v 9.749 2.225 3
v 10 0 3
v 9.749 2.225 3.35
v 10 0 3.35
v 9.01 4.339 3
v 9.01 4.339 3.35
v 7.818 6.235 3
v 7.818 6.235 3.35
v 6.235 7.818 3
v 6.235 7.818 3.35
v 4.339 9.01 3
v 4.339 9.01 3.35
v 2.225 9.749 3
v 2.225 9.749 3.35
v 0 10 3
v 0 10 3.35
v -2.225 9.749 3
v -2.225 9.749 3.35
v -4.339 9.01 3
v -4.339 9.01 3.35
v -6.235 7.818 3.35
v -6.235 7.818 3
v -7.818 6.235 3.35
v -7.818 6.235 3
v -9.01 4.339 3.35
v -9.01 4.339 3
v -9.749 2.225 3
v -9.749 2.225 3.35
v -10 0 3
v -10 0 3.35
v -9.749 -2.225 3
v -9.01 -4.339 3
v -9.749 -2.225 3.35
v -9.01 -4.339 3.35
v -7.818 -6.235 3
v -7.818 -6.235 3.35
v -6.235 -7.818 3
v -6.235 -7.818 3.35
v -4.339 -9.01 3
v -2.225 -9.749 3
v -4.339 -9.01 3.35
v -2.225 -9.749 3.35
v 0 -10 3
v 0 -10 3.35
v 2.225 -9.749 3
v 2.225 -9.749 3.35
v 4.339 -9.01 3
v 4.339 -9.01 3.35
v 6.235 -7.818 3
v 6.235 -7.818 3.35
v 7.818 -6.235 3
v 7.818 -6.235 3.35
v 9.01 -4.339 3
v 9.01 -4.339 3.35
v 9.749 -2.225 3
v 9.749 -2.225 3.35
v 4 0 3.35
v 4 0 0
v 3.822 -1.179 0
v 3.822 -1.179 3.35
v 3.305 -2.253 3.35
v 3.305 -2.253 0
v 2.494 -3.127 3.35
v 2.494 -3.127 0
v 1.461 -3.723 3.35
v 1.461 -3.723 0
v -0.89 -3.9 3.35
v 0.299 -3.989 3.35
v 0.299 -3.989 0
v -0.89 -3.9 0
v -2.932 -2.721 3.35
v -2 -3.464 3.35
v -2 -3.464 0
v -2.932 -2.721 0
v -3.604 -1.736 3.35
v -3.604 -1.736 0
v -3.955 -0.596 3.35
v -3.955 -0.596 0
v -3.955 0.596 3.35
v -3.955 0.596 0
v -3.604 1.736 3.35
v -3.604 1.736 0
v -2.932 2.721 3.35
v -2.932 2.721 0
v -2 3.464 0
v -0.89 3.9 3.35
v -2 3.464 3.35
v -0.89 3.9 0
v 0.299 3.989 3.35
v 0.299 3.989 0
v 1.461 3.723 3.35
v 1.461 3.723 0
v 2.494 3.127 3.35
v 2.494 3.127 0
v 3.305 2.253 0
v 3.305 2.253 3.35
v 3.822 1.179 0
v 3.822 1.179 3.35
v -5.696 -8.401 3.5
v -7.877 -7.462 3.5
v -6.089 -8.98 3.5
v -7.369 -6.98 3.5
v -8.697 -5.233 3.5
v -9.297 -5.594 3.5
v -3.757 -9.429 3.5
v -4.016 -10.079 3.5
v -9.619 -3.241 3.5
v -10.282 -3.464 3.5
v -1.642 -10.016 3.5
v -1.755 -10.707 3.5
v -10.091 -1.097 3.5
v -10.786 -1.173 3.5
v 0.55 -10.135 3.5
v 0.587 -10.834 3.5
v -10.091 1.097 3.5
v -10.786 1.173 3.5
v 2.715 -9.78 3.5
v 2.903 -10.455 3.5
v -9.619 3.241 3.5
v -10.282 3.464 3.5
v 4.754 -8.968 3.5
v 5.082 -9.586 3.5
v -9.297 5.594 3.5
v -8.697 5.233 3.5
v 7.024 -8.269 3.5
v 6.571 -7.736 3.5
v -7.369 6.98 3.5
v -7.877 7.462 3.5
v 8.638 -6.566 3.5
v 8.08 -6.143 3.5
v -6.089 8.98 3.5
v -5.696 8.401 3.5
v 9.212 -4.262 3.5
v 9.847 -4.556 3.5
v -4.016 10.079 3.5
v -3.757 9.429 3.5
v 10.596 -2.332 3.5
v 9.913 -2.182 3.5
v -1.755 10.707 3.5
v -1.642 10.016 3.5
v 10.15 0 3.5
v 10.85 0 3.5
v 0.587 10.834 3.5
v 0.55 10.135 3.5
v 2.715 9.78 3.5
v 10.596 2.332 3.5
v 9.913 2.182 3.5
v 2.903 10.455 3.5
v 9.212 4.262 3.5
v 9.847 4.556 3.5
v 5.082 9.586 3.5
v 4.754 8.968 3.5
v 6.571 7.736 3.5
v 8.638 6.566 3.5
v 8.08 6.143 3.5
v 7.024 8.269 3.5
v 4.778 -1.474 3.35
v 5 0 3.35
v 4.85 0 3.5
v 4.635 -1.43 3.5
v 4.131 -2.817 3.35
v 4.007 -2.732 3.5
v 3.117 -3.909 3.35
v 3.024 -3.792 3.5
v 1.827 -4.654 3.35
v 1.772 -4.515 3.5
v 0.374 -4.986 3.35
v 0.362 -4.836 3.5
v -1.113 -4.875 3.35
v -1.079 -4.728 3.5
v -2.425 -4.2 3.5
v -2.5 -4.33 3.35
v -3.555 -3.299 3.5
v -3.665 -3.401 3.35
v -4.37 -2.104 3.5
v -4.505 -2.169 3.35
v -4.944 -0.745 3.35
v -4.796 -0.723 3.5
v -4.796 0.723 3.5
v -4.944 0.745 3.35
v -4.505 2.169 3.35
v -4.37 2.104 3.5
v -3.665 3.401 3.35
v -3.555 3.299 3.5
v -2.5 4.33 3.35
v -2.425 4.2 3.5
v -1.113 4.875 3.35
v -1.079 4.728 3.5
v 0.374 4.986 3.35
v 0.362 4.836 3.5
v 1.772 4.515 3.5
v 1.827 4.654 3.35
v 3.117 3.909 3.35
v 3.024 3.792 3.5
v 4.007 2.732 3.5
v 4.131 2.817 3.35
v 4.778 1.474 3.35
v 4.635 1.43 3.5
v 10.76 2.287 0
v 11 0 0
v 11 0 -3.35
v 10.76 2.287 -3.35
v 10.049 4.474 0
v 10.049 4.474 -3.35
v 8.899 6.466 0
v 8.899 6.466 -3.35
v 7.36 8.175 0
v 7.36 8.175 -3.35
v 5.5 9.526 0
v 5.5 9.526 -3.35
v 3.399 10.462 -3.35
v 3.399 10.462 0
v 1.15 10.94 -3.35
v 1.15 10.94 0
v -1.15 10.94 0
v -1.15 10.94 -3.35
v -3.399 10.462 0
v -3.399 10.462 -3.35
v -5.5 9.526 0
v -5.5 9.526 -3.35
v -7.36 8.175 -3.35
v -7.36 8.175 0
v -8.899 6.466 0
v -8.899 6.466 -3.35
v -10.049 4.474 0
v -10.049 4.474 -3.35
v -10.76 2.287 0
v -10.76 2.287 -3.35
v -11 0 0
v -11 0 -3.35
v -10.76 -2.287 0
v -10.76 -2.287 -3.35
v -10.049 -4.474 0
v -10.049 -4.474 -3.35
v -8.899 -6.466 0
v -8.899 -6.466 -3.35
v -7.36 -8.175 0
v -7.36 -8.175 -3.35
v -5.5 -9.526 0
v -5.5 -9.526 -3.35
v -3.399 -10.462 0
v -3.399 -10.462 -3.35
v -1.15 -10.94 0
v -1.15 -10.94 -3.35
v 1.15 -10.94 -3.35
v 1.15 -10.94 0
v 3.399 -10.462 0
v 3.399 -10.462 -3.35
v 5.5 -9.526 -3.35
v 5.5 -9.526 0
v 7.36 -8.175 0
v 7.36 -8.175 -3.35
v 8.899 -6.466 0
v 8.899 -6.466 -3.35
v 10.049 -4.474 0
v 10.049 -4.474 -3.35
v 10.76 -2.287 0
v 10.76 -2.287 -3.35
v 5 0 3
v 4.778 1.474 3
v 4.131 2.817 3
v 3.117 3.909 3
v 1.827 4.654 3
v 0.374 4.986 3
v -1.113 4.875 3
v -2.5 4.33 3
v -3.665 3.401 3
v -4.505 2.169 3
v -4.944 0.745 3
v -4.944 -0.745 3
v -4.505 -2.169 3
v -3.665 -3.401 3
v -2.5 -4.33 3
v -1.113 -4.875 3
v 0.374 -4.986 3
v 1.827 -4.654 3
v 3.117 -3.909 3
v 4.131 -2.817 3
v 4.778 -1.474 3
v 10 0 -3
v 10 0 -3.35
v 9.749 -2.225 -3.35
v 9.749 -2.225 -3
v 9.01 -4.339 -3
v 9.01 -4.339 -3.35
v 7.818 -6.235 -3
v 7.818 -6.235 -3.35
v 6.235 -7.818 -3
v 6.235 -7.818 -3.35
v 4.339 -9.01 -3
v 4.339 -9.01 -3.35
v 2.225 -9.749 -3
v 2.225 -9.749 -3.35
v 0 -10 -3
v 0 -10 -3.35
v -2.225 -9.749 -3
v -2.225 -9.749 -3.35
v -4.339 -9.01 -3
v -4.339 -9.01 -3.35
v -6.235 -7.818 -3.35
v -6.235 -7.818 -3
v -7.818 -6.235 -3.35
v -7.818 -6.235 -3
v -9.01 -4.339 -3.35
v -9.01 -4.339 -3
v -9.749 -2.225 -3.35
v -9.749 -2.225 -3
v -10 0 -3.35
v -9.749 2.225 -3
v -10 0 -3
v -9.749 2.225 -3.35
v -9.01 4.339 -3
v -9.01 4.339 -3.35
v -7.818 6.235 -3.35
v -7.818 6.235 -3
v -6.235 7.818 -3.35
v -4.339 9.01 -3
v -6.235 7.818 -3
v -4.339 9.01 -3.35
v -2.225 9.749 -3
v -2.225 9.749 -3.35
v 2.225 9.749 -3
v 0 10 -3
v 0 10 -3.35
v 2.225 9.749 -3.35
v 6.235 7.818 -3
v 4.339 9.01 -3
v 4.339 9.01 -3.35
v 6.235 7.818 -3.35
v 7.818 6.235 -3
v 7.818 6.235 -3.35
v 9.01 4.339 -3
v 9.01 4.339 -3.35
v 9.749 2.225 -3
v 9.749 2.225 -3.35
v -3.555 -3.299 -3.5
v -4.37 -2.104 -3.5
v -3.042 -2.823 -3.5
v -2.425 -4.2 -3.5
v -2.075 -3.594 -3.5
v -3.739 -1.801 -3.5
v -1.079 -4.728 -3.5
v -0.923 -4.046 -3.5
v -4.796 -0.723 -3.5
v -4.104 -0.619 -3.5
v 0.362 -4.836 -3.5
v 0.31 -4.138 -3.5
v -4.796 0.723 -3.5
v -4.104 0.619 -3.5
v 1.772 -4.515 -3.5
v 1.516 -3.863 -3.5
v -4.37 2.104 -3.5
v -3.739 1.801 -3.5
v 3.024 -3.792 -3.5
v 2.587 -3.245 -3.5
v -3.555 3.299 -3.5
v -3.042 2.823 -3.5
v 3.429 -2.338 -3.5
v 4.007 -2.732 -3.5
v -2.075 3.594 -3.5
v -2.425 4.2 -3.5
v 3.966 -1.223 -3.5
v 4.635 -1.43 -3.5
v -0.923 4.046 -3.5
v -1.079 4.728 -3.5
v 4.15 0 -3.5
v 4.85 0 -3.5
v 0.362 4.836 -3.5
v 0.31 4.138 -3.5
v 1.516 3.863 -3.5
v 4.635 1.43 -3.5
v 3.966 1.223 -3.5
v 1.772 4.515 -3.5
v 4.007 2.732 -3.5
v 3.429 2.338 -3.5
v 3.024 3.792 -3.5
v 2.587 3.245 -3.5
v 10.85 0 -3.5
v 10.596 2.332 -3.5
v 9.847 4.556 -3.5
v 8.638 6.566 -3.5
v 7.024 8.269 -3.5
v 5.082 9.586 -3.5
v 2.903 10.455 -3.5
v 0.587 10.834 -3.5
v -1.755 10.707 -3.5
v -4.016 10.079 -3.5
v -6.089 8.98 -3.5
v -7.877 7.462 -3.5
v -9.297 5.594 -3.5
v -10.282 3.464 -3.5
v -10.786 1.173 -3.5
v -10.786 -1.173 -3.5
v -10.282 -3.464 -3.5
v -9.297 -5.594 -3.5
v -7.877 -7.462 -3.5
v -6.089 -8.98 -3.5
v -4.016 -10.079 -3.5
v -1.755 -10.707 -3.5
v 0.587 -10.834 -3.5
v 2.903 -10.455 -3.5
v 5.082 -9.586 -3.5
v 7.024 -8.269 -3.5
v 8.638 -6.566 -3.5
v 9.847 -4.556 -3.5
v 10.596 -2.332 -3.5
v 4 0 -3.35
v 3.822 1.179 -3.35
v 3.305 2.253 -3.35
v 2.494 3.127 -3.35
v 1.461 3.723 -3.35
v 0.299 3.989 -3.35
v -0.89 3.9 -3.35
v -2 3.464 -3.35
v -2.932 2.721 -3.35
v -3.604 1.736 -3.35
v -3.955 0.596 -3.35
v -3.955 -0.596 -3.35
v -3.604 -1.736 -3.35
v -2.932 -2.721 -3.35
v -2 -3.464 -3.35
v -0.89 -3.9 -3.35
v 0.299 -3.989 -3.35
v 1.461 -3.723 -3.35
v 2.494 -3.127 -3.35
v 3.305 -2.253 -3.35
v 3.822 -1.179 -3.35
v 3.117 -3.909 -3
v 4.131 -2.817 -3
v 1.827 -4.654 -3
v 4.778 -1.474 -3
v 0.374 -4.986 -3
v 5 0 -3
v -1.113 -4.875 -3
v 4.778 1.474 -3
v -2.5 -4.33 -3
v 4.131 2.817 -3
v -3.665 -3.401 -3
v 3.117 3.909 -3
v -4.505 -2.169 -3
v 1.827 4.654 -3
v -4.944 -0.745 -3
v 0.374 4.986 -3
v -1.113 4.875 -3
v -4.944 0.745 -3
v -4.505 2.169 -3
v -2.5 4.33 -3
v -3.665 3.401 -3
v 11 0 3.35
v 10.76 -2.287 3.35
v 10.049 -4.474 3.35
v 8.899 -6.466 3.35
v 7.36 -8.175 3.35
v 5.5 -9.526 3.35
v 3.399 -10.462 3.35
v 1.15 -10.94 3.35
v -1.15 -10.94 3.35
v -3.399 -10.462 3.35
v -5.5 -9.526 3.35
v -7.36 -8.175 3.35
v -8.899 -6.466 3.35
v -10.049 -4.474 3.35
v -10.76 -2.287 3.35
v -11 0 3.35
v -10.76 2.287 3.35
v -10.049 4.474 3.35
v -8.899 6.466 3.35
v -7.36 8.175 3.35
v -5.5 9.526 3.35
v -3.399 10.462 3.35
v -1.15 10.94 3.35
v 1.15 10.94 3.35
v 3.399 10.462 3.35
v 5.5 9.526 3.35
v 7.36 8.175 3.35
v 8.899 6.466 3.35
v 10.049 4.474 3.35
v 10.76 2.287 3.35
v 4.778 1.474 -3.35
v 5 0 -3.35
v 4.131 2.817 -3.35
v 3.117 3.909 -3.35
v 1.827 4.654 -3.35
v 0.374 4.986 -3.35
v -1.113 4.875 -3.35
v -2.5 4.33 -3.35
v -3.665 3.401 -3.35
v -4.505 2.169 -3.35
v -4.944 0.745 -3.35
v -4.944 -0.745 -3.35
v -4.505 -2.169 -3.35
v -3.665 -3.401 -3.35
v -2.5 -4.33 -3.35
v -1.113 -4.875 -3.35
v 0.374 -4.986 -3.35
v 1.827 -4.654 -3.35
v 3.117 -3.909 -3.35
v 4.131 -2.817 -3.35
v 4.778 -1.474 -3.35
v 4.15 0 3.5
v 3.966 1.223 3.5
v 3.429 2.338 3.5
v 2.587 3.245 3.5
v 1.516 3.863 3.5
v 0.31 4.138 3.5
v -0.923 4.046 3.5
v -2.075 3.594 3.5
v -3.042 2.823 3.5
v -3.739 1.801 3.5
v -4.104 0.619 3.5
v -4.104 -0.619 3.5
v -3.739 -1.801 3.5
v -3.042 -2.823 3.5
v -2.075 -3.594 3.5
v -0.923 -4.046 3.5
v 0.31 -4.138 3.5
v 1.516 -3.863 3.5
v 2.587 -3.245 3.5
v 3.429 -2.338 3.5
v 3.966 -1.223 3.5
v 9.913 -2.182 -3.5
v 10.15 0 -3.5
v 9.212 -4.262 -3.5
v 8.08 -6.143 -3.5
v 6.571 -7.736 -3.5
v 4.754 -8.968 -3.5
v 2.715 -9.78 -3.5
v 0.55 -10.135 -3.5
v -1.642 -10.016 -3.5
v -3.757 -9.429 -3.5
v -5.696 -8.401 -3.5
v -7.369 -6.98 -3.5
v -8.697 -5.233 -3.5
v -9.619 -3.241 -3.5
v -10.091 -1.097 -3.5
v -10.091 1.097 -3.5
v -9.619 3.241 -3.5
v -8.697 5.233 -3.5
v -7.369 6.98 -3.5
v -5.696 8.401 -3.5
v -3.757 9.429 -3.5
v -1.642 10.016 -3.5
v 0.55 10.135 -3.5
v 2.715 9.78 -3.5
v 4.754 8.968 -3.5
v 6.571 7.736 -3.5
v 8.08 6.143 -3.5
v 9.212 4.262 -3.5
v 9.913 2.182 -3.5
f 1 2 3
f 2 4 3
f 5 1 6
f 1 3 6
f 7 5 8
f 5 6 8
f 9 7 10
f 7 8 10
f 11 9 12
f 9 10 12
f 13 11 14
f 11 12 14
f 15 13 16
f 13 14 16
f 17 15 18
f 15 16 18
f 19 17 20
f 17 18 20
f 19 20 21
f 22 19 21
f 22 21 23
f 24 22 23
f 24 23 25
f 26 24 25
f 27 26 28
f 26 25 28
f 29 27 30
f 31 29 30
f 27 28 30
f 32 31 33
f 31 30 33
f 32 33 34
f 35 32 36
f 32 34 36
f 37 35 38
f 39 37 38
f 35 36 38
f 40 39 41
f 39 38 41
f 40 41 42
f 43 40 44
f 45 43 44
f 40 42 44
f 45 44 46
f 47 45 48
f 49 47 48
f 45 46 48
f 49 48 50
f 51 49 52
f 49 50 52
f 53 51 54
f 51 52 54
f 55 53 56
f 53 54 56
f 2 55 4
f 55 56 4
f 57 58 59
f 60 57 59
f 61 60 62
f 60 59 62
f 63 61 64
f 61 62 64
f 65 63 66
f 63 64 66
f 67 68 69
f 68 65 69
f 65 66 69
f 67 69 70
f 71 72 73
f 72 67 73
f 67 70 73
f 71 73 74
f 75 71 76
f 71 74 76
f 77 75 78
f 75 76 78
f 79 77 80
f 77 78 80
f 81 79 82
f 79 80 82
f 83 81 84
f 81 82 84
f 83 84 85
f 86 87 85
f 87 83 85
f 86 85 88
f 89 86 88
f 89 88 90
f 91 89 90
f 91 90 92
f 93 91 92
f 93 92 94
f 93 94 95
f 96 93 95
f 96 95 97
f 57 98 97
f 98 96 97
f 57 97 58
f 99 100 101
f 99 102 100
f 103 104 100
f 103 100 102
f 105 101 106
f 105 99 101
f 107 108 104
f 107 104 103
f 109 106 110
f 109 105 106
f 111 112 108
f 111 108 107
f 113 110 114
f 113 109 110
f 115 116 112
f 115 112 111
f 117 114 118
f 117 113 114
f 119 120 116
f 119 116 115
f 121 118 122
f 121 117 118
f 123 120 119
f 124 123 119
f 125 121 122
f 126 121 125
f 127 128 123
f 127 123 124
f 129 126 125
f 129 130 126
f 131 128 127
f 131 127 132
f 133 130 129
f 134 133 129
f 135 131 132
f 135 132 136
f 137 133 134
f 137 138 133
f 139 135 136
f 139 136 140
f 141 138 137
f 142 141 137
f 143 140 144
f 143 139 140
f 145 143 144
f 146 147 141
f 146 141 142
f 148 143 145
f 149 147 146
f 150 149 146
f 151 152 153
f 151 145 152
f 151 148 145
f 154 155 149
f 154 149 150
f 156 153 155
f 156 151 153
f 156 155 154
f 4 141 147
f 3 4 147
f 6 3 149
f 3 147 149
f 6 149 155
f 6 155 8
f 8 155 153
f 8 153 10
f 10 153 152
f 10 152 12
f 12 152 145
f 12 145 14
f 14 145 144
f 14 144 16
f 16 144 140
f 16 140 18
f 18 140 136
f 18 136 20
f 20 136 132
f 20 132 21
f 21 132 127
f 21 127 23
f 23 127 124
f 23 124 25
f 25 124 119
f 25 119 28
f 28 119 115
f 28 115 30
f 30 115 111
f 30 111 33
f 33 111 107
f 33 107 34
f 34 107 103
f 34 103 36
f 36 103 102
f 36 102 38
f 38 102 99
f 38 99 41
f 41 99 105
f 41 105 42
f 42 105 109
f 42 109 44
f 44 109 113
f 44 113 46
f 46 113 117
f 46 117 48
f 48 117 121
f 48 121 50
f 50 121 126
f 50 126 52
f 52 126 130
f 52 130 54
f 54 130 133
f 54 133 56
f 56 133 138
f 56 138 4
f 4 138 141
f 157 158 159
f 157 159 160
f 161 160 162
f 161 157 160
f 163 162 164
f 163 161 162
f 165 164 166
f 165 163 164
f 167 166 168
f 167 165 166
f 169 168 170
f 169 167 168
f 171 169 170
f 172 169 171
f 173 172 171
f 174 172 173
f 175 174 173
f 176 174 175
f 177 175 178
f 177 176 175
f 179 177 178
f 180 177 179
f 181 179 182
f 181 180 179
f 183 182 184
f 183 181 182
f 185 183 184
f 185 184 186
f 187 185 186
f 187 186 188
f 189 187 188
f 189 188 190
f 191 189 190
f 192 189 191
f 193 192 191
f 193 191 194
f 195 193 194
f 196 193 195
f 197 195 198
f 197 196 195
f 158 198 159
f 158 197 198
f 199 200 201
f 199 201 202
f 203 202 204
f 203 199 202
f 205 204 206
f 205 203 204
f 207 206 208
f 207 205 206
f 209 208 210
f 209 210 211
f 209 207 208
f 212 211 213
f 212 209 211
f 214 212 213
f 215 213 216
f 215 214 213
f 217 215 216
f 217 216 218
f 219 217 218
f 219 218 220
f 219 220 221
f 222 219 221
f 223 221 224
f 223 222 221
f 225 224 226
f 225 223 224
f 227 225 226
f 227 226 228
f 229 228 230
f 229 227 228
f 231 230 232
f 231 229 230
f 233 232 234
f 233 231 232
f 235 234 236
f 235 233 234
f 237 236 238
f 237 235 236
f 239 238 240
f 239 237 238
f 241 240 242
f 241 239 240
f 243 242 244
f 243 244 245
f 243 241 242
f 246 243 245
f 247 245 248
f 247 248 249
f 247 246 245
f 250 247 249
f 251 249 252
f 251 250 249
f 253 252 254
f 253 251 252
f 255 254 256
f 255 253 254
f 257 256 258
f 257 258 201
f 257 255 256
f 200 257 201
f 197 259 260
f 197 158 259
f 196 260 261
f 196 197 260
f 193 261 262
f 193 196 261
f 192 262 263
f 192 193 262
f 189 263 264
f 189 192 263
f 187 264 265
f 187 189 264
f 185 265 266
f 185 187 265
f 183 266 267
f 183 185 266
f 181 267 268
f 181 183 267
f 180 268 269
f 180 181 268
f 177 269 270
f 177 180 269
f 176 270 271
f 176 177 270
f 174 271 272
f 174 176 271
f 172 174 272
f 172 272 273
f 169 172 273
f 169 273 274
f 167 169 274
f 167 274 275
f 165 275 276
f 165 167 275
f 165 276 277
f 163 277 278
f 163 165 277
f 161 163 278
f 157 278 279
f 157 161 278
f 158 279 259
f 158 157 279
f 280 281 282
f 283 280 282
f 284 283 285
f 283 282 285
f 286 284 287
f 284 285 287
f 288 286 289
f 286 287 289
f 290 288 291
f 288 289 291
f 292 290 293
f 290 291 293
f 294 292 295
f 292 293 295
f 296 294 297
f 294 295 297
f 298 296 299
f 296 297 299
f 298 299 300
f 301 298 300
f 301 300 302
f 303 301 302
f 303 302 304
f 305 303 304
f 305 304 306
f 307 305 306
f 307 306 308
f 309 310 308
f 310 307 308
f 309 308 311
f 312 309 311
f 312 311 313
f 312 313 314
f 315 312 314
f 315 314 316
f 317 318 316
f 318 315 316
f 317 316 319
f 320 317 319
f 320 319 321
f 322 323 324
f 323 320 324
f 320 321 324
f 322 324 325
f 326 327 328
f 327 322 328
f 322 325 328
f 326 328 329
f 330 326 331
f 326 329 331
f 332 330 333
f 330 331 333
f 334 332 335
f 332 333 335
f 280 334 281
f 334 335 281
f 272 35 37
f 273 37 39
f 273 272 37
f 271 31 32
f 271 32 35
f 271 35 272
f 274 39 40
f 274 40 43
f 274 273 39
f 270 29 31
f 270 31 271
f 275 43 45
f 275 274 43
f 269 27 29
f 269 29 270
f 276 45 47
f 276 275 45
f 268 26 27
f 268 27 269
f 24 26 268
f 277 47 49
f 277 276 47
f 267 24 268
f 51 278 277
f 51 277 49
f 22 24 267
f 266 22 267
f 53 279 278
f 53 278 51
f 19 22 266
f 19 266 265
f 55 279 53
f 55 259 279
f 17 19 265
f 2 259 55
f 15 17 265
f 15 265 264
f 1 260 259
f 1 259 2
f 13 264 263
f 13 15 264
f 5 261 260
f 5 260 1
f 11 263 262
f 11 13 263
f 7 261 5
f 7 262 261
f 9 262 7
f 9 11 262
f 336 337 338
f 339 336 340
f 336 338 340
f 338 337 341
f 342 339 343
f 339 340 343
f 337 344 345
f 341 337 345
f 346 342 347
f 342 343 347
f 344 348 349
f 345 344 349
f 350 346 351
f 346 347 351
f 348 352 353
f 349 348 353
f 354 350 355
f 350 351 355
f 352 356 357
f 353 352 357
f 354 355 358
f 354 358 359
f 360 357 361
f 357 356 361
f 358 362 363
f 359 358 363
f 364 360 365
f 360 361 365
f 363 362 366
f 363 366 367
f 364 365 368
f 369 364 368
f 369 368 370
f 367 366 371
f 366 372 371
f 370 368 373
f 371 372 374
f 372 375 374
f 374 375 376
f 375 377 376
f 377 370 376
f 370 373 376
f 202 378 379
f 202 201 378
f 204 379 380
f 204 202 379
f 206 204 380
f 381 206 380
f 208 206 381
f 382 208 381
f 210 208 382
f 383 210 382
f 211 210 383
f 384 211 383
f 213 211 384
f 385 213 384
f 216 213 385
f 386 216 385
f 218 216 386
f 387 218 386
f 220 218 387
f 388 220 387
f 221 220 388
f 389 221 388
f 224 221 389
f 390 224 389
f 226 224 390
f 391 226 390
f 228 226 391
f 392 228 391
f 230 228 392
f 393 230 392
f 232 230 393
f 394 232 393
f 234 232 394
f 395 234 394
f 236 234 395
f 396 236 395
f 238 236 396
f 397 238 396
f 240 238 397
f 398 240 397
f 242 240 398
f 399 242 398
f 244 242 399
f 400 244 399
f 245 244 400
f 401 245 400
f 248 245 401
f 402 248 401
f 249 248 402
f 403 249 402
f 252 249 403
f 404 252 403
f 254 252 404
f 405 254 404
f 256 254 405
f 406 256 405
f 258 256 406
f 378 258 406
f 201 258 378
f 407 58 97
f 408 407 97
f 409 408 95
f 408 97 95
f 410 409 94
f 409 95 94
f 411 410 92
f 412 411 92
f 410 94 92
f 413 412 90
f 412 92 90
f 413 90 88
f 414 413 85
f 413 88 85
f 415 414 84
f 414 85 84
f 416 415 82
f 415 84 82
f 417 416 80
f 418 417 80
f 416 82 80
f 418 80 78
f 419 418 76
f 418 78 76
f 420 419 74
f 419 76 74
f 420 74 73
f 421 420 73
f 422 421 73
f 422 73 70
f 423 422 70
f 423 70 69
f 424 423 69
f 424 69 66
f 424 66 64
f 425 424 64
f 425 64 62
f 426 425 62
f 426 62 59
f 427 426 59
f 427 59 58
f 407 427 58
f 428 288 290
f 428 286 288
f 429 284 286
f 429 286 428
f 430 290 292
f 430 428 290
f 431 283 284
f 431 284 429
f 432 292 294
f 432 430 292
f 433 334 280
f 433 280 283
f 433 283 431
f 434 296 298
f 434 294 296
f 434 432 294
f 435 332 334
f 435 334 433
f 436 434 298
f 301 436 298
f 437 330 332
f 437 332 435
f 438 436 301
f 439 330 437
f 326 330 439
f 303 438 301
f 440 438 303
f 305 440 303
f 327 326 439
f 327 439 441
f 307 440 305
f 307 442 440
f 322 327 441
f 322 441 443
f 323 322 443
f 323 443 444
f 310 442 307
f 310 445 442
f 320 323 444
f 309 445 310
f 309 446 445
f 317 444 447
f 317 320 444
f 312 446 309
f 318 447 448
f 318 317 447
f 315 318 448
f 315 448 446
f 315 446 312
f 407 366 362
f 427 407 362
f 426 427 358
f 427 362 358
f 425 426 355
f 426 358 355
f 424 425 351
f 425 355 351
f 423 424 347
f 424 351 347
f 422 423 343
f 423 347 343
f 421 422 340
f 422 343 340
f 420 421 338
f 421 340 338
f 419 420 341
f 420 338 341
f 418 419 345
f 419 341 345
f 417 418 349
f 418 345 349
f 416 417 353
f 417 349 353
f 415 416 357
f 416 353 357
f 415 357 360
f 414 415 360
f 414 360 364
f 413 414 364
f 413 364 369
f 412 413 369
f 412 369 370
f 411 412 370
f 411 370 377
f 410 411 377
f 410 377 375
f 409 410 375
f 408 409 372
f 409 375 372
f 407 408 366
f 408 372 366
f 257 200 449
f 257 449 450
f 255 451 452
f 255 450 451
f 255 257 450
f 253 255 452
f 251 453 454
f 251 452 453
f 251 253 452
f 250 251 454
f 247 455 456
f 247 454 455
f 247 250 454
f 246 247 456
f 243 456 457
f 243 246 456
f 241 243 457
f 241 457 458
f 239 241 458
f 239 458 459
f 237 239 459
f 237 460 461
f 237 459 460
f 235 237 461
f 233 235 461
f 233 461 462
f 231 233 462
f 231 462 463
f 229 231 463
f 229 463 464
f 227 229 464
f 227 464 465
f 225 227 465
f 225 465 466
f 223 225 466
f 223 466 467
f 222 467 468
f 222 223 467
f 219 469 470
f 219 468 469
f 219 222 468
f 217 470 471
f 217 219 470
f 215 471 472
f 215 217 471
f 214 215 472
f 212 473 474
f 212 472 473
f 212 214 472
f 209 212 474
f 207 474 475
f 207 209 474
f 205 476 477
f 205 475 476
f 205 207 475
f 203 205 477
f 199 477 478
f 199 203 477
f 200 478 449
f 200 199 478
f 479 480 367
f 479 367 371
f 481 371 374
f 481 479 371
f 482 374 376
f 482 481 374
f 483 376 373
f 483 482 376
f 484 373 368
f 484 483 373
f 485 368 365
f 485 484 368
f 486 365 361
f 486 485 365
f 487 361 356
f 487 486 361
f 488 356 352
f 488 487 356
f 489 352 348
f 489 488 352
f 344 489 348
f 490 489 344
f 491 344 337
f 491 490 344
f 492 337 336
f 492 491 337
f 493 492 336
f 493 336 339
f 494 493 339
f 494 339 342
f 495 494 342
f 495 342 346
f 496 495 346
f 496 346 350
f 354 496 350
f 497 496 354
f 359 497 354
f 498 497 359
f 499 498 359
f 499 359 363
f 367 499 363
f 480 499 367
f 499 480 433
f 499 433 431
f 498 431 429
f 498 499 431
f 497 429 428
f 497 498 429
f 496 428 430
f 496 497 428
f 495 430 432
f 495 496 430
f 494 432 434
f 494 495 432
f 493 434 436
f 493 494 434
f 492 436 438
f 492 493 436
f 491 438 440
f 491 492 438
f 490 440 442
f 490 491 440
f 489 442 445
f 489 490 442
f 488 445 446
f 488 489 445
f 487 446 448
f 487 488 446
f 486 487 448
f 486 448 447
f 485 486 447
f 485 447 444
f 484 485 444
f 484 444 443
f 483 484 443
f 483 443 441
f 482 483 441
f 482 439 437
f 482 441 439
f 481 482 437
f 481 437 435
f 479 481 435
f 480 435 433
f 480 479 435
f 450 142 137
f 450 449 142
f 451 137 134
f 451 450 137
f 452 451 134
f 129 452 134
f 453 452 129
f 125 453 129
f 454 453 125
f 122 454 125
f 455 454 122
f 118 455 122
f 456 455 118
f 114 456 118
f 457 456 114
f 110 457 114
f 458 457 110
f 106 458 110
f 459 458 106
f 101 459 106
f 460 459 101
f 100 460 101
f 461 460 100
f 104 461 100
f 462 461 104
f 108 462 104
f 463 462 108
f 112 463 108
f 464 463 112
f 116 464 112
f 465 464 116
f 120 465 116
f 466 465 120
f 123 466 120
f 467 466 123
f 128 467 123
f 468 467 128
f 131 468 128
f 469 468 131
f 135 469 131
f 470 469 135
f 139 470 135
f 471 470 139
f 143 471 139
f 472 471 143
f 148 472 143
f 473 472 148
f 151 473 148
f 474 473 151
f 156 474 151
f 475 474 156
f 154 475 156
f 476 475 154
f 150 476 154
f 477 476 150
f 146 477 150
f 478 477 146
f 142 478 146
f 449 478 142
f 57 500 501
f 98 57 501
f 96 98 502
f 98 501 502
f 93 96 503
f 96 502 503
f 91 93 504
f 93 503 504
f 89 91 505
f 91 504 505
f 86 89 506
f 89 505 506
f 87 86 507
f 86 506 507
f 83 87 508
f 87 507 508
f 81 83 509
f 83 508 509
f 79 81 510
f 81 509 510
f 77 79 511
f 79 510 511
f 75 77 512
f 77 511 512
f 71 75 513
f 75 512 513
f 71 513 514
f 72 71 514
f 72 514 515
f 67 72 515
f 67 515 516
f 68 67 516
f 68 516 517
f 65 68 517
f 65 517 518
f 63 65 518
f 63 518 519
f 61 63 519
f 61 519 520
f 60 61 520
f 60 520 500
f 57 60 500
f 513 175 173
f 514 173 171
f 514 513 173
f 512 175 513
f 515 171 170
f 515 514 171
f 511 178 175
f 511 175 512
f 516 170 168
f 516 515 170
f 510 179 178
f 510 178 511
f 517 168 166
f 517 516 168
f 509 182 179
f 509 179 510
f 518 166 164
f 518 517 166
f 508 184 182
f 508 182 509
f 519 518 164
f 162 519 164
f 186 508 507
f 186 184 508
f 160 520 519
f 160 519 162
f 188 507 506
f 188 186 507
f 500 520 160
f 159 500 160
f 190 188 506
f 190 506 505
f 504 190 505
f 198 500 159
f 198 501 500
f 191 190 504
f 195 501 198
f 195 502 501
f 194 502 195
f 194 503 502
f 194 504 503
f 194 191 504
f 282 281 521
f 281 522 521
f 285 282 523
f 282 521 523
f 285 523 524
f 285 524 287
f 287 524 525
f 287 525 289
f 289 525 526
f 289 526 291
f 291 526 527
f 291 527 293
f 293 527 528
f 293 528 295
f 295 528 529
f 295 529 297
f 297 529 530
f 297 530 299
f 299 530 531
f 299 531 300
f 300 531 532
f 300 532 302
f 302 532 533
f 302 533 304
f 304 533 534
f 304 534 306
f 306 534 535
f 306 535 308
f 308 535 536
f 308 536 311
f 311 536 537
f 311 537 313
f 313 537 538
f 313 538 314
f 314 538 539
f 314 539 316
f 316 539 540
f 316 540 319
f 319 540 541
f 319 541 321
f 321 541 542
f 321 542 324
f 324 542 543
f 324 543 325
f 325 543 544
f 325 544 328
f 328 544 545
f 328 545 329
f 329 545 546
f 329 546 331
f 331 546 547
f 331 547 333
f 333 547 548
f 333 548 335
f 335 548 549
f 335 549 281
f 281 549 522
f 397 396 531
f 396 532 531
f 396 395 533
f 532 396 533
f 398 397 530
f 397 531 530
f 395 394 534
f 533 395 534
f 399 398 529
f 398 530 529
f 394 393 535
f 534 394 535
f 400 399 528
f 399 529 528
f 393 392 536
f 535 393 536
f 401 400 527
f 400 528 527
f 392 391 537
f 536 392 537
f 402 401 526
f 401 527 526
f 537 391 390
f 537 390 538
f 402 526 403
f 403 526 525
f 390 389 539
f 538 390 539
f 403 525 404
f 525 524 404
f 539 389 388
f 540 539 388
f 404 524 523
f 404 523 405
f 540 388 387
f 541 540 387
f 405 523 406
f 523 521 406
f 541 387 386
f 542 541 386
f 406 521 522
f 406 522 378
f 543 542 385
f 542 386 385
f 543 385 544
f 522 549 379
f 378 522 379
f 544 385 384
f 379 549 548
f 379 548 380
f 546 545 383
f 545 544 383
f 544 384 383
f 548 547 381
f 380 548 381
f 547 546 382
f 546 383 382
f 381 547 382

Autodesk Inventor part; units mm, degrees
ref_plane "YZ Plane" through (0, 0, 0) normal (1, 0, 0) x (0, 1, 0)
ref_plane "XZ Plane" through (0, 0, 0) normal (0, 1, 0) x (-1, 0, 0)
ref_plane "XY Plane" through (0, 0, 0) normal (0, 0, 1) x (1, 0, 0)
sketch "Sketch1" plane through (0, 0, 0) normal (0, 0, 1) x (1, 0, 0)
  circle A0 centre (0, 0) radius 11
  circle A1 centre (0, 0) radius 4
  dimension "d0" = 22
  dimension "d1" = 8
extrude "Extrusion1" add sketch "Sketch1" along normal mid plane 7
sketch "Sketch2" plane through (0, 0, 3.5) normal (0, 0, 1) x (1, 0, 0)
  circle A0 centre (0, 0) radius 10
  circle A1 centre (0, 0) radius 5
  circle A2 centre (0, 0) radius 11 projected
  circle A3 centre (0, 0) radius 4 projected
  dimension "d4" = 1
  dimension "d5" = 1
extrude "Extrusion2" cut sketch "Sketch2" against normal blind 0.5 contours A0
mirror "Mirror1" about plane through (0, 0, 0) normal (0, 0, 1) of "Extrusion2"
chamfer "Chamfer1" distance 0.15 angle 45 8 edges at (-11, 0, 3.5) (-11, 0, -3.5) (-10, 0, 3.5) (-5, 0, 3.5) (-4, 0, 3.5) (-10, 0, -3.5) (-5, 0, -3.5) (-4, 0, -3.5)
properties part number "SS608-2RS"
